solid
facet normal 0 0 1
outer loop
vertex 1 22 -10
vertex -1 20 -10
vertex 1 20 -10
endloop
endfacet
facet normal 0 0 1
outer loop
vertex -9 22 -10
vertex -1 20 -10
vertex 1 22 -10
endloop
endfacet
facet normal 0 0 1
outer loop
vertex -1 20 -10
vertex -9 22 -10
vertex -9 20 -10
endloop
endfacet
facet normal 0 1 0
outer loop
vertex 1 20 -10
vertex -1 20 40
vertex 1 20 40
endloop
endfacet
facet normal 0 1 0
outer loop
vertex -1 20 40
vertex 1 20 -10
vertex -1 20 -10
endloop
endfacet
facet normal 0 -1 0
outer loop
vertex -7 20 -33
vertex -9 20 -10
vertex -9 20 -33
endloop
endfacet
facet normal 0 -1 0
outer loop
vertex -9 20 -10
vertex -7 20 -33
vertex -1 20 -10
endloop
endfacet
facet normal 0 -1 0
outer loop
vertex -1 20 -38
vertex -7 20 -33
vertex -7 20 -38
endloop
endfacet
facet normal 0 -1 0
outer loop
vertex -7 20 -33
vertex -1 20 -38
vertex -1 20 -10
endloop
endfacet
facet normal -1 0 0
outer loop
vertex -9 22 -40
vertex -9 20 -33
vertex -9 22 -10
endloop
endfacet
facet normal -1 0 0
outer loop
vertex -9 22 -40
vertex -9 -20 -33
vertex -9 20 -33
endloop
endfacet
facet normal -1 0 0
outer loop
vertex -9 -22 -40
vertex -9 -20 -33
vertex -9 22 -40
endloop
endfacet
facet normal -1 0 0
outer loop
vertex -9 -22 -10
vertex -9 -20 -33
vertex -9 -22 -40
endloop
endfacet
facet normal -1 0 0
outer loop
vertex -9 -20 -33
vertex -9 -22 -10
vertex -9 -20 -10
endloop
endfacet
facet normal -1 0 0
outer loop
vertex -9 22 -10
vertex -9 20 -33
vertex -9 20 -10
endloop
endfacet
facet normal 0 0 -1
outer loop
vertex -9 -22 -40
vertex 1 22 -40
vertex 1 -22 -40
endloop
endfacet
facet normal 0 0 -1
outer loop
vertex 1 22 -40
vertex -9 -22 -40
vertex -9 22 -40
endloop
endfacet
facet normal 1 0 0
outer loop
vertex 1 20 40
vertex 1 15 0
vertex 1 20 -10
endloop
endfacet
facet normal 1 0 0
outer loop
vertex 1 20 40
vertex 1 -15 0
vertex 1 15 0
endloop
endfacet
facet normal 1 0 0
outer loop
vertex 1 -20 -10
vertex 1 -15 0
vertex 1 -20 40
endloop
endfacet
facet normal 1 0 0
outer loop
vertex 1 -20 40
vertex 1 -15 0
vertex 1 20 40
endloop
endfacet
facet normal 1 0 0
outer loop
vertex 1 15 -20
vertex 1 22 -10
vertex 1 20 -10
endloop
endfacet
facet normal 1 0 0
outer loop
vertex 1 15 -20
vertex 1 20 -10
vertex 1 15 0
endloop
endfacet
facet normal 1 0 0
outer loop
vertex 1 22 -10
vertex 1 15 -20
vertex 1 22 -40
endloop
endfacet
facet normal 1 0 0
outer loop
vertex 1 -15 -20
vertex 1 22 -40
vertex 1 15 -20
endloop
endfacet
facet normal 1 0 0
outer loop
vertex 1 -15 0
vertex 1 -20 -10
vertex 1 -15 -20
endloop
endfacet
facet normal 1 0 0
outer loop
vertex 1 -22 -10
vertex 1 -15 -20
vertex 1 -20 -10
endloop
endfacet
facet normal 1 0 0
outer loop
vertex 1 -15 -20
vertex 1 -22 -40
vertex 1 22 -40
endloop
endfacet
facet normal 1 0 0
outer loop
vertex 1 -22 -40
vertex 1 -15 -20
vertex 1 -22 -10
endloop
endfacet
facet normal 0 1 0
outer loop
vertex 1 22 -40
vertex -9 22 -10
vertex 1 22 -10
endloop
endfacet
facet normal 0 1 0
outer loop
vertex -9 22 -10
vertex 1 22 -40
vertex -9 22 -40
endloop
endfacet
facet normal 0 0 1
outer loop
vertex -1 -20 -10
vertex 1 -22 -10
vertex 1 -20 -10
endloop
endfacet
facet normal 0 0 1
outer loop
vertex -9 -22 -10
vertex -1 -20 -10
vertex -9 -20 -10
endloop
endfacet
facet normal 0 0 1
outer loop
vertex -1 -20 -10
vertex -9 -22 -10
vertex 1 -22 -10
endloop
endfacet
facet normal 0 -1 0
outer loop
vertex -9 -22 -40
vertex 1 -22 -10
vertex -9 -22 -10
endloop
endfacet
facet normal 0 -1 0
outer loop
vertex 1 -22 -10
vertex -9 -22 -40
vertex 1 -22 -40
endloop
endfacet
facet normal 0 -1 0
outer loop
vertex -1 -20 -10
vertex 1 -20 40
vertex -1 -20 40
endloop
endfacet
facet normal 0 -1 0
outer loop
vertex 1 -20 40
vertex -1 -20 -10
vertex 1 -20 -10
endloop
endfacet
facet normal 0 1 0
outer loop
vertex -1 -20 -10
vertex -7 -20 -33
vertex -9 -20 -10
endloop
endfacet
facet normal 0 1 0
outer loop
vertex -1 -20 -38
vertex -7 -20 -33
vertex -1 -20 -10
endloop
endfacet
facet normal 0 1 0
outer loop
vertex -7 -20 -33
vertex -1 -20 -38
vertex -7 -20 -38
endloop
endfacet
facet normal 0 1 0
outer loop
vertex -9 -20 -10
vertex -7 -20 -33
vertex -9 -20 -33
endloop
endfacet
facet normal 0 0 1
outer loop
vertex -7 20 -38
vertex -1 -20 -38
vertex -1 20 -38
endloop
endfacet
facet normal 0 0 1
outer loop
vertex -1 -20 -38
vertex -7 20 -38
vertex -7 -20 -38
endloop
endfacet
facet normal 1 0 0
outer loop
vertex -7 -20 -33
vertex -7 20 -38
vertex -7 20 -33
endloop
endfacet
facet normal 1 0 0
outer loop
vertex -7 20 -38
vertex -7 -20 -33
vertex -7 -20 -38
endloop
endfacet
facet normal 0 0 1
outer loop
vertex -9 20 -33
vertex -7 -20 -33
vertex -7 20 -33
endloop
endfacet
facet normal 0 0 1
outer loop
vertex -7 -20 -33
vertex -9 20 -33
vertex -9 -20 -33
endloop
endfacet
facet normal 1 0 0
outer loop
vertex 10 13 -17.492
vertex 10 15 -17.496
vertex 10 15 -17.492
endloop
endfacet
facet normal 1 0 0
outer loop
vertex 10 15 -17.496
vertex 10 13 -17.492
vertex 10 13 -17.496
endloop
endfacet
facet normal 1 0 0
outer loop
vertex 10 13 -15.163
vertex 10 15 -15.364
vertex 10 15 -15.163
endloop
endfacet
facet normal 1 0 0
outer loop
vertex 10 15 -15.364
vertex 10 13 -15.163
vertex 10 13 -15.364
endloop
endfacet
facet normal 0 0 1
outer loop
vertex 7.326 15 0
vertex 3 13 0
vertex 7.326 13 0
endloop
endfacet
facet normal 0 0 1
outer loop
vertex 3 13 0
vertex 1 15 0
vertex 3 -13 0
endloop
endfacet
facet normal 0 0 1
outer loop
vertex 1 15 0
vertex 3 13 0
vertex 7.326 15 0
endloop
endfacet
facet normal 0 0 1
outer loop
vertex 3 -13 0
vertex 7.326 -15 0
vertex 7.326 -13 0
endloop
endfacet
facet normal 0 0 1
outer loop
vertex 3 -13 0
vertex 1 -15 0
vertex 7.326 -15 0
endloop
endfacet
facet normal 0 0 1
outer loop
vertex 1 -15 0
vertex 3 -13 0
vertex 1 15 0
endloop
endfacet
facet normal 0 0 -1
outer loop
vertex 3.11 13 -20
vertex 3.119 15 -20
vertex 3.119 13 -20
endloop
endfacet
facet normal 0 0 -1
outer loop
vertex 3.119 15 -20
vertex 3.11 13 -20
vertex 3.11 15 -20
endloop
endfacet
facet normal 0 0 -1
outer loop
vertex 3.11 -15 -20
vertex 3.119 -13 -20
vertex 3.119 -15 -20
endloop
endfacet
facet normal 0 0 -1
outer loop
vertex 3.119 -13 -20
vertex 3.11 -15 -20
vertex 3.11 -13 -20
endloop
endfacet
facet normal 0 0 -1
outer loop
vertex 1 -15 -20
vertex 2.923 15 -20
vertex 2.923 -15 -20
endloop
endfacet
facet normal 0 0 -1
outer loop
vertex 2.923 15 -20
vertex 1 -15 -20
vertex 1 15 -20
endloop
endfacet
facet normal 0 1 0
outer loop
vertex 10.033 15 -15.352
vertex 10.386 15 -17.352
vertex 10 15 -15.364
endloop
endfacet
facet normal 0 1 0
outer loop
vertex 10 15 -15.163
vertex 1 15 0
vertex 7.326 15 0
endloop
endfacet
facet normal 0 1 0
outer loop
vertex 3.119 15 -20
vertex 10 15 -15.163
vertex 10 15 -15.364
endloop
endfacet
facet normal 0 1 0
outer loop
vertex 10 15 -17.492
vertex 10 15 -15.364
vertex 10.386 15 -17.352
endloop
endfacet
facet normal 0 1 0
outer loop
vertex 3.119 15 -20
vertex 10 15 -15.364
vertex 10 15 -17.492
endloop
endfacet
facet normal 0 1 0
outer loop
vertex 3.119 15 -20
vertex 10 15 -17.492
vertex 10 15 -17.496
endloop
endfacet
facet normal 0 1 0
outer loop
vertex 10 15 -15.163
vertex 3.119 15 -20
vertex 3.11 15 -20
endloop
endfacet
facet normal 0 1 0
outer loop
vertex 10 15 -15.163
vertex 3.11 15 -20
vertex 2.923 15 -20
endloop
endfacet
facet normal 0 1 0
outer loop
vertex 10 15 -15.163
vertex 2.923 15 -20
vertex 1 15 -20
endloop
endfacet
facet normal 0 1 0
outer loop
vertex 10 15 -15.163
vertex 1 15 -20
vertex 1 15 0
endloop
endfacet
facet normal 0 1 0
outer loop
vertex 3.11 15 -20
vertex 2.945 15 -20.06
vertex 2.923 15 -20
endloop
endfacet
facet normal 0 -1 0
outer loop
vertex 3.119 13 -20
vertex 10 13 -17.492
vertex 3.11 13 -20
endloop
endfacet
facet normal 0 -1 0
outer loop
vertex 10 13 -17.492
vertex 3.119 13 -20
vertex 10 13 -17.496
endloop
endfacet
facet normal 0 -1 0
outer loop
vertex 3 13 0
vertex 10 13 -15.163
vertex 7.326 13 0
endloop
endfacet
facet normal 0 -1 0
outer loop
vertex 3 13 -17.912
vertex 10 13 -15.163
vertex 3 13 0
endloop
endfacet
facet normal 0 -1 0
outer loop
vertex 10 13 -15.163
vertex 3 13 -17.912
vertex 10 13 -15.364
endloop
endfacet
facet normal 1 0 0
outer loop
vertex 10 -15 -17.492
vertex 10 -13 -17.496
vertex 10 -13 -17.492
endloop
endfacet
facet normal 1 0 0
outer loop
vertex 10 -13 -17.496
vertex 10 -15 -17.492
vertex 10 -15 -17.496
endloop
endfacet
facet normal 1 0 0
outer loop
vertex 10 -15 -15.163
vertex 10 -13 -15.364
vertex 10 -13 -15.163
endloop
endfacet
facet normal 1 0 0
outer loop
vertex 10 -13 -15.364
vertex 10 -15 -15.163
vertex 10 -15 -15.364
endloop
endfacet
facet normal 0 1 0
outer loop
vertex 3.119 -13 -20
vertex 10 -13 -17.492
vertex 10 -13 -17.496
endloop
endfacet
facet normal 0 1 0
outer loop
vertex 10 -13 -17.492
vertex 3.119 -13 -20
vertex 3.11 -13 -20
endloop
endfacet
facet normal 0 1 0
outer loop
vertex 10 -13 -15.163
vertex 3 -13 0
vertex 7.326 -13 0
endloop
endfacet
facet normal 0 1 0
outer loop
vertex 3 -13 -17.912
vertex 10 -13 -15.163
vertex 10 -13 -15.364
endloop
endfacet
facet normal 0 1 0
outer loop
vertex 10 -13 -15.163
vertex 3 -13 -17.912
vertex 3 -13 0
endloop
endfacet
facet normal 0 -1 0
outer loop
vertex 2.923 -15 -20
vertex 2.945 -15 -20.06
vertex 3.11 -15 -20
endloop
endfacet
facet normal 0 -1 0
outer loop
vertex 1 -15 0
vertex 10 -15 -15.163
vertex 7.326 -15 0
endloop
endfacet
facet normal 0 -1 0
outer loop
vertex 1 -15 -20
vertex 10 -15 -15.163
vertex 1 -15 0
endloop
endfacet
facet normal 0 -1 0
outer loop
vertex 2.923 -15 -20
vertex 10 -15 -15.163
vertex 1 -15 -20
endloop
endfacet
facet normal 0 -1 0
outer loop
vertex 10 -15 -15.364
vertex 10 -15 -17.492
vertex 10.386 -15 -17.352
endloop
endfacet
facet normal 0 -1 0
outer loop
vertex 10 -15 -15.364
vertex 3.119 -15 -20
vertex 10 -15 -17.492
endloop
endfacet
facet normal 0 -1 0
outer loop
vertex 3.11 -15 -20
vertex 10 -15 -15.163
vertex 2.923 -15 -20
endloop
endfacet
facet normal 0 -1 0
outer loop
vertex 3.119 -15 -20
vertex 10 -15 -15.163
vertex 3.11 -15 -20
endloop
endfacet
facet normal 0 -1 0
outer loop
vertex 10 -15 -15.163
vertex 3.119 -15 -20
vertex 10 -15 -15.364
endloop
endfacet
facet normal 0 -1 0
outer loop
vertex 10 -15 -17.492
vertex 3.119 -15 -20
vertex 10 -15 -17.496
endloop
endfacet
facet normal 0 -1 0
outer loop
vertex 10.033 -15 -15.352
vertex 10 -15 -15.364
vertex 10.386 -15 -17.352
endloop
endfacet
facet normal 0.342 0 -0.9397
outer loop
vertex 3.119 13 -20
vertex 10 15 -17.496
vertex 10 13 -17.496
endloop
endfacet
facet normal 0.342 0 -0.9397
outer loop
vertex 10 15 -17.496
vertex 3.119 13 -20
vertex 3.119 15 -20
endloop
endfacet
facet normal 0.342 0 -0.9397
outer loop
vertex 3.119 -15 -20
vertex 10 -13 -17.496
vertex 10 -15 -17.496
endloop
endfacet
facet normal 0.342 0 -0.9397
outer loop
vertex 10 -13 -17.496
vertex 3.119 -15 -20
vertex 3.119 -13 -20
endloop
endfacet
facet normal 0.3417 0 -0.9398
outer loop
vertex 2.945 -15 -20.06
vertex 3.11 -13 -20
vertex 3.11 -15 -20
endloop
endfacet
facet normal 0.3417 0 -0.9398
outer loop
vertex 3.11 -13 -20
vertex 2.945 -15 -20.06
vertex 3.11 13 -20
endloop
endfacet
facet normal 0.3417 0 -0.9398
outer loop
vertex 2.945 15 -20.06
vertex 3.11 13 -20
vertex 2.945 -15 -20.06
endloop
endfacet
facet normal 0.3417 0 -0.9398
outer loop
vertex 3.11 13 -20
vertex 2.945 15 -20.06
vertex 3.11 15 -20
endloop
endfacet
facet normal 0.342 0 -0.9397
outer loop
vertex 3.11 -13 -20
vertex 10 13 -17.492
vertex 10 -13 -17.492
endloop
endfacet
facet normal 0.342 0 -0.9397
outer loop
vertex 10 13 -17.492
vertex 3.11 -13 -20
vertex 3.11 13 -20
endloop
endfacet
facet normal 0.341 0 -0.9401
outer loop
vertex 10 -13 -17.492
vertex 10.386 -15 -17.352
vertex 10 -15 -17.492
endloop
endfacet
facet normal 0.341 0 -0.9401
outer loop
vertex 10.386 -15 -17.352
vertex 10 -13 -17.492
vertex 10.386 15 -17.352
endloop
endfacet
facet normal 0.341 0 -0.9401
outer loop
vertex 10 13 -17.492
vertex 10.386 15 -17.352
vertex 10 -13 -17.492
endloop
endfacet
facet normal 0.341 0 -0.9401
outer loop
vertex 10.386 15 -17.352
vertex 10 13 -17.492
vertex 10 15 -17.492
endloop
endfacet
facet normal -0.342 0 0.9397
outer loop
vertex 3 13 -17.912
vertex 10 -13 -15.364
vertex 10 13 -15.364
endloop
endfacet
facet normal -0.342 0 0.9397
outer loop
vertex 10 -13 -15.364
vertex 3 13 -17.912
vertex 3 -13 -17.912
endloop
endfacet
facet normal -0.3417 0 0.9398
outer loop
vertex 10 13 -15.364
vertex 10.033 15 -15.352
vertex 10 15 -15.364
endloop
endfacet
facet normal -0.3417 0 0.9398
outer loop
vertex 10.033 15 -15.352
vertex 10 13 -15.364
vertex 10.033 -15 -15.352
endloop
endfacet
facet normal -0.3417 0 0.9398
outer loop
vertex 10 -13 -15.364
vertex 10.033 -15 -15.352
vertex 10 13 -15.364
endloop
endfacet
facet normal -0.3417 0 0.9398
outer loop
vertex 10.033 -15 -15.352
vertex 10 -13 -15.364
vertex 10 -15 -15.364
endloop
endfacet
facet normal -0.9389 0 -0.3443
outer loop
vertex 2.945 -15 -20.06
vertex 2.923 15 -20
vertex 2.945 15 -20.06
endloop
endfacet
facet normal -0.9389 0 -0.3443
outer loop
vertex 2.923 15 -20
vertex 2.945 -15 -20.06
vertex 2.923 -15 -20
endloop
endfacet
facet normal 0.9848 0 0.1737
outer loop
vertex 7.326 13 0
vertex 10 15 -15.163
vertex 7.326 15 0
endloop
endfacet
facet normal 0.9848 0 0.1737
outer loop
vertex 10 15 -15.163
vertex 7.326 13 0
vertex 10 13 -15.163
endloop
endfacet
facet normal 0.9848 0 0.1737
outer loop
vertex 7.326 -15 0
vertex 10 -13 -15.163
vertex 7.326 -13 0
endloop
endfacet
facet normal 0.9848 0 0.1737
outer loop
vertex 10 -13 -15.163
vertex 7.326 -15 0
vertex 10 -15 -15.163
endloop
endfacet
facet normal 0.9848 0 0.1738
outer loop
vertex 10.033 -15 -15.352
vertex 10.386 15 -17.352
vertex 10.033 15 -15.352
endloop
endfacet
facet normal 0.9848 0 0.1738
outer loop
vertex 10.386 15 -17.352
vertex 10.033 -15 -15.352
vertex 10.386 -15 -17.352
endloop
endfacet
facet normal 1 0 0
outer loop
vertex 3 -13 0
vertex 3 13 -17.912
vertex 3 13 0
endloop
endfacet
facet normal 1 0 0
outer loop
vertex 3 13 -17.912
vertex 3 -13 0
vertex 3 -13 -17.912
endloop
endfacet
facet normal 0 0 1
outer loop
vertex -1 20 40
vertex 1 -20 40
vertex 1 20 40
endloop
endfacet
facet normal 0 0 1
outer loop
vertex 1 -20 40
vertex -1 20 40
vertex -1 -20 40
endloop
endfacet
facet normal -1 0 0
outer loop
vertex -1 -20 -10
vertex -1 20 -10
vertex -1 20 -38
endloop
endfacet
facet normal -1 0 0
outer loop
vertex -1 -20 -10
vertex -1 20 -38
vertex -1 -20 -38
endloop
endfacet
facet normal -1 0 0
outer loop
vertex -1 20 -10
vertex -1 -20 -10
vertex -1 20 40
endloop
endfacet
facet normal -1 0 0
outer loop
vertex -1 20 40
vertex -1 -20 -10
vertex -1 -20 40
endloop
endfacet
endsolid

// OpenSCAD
BASE_X =2;
BASE_Y =40;
BASE_Z =80;

LATERAL1_X =2;
LATERAL1_Y =10;
LATERAL1_Z =30;

SUELO1_X =2;
SUELO1_Y =40;
SUELO1_Z =10;

FRONTAL1_X=2;
FRONTAL1_Y=40;
FRONTAL1_Z=7;

FRONTAL2_X=2;
FRONTAL2_Y=30;
FRONTAL2_Z=20;

LATERAL2_X =10;
LATERAL2_Y =2;
LATERAL2_Z =20;

DIF1_X=2;
DIF1_Y=30;
DIF1_Z=20;

DIF2_X=15;
DIF2_Y=30;
DIF2_Z=25;

union(){
    cube([BASE_X,BASE_Y,BASE_Z], center = true);
    piezaDelantera();
    piezaTrasera();
}

module piezaDelantera(){
    union(){
        rotate([0,0,90])
        translate([BASE_Y/2+BASE_X/2,LATERAL1_Y/2-BASE_X/2,-(BASE_Z/2-LATERAL1_Z/2)])
        cube([LATERAL1_X,LATERAL1_Y,LATERAL1_Z], center = true);
    }
    
    union(){
        rotate([0,0,90])
        translate([-(BASE_Y/2+BASE_X/2),LATERAL1_Y/2-BASE_X/2,-(BASE_Z/2-LATERAL1_Z/2)])
        cube([LATERAL1_X,LATERAL1_Y,LATERAL1_Z], center = true);
    }
    
    union(){
        rotate([0,90,0])
        translate([BASE_Z/2-BASE_X/2,0,-(LATERAL1_Y/2 - BASE_X/2)])
        cube([SUELO1_X,SUELO1_Y,SUELO1_Z], center = true);
    }
    
    union(){
        translate([(-LATERAL1_Y + FRONTAL1_X),0,-(BASE_Z/2-FRONTAL1_Z/2)])
        cube([FRONTAL1_X,FRONTAL1_Y,FRONTAL1_Z], center = true);
    }
}

module piezaTrasera(){
    
    union(){
        translate([BASE_X,0,-BASE_Z/8])
        cube([FRONTAL2_X,FRONTAL2_Y,FRONTAL2_Z], center = true);
    }
    
    difference(){
        union(){
            difference(){
                union(){
                    union(){
                        translate([FRONTAL2_X+BASE_X+LATERAL2_Y/2,FRONTAL2_Y/2-LATERAL2_Y/2,-BASE_Z/8])
                        cube([LATERAL2_X,LATERAL2_Y,LATERAL2_Z], center = true);
                    }
        
                    union(){
                        translate([FRONTAL2_X+BASE_X+LATERAL2_Y/2,-(FRONTAL2_Y/2-LATERAL2_Y/2),-BASE_Z/8])
                        cube([LATERAL2_X,LATERAL2_Y,LATERAL2_Z], center = true);
                    }
                }
        
                union(){
                    translate([BASE_X+LATERAL2_X+1,0,-(BASE_Z/8+LATERAL2_X-DIF1_X/2-BASE_X/2)])
                    rotate([0,70,0])
                    cube([DIF1_X+1,DIF1_Y+2,DIF1_Z], center = true);
                }
            }    
    
            union(){
                translate([BASE_X+LATERAL2_X,0,-(BASE_Z/8+LATERAL2_X-DIF1_X/2-3.3)])
                rotate([0,70,0])
                cube([DIF1_X,DIF1_Y,DIF1_Z], center = true);
            }
        }
    
        union(){
            translate([LATERAL2_Y*8,0,-LATERAL2_Z/2+BASE_X*2])
            rotate([0,-10,0])
            cube([DIF2_X,DIF2_Y+2,DIF2_Z], center = true);
        }
    }
}
